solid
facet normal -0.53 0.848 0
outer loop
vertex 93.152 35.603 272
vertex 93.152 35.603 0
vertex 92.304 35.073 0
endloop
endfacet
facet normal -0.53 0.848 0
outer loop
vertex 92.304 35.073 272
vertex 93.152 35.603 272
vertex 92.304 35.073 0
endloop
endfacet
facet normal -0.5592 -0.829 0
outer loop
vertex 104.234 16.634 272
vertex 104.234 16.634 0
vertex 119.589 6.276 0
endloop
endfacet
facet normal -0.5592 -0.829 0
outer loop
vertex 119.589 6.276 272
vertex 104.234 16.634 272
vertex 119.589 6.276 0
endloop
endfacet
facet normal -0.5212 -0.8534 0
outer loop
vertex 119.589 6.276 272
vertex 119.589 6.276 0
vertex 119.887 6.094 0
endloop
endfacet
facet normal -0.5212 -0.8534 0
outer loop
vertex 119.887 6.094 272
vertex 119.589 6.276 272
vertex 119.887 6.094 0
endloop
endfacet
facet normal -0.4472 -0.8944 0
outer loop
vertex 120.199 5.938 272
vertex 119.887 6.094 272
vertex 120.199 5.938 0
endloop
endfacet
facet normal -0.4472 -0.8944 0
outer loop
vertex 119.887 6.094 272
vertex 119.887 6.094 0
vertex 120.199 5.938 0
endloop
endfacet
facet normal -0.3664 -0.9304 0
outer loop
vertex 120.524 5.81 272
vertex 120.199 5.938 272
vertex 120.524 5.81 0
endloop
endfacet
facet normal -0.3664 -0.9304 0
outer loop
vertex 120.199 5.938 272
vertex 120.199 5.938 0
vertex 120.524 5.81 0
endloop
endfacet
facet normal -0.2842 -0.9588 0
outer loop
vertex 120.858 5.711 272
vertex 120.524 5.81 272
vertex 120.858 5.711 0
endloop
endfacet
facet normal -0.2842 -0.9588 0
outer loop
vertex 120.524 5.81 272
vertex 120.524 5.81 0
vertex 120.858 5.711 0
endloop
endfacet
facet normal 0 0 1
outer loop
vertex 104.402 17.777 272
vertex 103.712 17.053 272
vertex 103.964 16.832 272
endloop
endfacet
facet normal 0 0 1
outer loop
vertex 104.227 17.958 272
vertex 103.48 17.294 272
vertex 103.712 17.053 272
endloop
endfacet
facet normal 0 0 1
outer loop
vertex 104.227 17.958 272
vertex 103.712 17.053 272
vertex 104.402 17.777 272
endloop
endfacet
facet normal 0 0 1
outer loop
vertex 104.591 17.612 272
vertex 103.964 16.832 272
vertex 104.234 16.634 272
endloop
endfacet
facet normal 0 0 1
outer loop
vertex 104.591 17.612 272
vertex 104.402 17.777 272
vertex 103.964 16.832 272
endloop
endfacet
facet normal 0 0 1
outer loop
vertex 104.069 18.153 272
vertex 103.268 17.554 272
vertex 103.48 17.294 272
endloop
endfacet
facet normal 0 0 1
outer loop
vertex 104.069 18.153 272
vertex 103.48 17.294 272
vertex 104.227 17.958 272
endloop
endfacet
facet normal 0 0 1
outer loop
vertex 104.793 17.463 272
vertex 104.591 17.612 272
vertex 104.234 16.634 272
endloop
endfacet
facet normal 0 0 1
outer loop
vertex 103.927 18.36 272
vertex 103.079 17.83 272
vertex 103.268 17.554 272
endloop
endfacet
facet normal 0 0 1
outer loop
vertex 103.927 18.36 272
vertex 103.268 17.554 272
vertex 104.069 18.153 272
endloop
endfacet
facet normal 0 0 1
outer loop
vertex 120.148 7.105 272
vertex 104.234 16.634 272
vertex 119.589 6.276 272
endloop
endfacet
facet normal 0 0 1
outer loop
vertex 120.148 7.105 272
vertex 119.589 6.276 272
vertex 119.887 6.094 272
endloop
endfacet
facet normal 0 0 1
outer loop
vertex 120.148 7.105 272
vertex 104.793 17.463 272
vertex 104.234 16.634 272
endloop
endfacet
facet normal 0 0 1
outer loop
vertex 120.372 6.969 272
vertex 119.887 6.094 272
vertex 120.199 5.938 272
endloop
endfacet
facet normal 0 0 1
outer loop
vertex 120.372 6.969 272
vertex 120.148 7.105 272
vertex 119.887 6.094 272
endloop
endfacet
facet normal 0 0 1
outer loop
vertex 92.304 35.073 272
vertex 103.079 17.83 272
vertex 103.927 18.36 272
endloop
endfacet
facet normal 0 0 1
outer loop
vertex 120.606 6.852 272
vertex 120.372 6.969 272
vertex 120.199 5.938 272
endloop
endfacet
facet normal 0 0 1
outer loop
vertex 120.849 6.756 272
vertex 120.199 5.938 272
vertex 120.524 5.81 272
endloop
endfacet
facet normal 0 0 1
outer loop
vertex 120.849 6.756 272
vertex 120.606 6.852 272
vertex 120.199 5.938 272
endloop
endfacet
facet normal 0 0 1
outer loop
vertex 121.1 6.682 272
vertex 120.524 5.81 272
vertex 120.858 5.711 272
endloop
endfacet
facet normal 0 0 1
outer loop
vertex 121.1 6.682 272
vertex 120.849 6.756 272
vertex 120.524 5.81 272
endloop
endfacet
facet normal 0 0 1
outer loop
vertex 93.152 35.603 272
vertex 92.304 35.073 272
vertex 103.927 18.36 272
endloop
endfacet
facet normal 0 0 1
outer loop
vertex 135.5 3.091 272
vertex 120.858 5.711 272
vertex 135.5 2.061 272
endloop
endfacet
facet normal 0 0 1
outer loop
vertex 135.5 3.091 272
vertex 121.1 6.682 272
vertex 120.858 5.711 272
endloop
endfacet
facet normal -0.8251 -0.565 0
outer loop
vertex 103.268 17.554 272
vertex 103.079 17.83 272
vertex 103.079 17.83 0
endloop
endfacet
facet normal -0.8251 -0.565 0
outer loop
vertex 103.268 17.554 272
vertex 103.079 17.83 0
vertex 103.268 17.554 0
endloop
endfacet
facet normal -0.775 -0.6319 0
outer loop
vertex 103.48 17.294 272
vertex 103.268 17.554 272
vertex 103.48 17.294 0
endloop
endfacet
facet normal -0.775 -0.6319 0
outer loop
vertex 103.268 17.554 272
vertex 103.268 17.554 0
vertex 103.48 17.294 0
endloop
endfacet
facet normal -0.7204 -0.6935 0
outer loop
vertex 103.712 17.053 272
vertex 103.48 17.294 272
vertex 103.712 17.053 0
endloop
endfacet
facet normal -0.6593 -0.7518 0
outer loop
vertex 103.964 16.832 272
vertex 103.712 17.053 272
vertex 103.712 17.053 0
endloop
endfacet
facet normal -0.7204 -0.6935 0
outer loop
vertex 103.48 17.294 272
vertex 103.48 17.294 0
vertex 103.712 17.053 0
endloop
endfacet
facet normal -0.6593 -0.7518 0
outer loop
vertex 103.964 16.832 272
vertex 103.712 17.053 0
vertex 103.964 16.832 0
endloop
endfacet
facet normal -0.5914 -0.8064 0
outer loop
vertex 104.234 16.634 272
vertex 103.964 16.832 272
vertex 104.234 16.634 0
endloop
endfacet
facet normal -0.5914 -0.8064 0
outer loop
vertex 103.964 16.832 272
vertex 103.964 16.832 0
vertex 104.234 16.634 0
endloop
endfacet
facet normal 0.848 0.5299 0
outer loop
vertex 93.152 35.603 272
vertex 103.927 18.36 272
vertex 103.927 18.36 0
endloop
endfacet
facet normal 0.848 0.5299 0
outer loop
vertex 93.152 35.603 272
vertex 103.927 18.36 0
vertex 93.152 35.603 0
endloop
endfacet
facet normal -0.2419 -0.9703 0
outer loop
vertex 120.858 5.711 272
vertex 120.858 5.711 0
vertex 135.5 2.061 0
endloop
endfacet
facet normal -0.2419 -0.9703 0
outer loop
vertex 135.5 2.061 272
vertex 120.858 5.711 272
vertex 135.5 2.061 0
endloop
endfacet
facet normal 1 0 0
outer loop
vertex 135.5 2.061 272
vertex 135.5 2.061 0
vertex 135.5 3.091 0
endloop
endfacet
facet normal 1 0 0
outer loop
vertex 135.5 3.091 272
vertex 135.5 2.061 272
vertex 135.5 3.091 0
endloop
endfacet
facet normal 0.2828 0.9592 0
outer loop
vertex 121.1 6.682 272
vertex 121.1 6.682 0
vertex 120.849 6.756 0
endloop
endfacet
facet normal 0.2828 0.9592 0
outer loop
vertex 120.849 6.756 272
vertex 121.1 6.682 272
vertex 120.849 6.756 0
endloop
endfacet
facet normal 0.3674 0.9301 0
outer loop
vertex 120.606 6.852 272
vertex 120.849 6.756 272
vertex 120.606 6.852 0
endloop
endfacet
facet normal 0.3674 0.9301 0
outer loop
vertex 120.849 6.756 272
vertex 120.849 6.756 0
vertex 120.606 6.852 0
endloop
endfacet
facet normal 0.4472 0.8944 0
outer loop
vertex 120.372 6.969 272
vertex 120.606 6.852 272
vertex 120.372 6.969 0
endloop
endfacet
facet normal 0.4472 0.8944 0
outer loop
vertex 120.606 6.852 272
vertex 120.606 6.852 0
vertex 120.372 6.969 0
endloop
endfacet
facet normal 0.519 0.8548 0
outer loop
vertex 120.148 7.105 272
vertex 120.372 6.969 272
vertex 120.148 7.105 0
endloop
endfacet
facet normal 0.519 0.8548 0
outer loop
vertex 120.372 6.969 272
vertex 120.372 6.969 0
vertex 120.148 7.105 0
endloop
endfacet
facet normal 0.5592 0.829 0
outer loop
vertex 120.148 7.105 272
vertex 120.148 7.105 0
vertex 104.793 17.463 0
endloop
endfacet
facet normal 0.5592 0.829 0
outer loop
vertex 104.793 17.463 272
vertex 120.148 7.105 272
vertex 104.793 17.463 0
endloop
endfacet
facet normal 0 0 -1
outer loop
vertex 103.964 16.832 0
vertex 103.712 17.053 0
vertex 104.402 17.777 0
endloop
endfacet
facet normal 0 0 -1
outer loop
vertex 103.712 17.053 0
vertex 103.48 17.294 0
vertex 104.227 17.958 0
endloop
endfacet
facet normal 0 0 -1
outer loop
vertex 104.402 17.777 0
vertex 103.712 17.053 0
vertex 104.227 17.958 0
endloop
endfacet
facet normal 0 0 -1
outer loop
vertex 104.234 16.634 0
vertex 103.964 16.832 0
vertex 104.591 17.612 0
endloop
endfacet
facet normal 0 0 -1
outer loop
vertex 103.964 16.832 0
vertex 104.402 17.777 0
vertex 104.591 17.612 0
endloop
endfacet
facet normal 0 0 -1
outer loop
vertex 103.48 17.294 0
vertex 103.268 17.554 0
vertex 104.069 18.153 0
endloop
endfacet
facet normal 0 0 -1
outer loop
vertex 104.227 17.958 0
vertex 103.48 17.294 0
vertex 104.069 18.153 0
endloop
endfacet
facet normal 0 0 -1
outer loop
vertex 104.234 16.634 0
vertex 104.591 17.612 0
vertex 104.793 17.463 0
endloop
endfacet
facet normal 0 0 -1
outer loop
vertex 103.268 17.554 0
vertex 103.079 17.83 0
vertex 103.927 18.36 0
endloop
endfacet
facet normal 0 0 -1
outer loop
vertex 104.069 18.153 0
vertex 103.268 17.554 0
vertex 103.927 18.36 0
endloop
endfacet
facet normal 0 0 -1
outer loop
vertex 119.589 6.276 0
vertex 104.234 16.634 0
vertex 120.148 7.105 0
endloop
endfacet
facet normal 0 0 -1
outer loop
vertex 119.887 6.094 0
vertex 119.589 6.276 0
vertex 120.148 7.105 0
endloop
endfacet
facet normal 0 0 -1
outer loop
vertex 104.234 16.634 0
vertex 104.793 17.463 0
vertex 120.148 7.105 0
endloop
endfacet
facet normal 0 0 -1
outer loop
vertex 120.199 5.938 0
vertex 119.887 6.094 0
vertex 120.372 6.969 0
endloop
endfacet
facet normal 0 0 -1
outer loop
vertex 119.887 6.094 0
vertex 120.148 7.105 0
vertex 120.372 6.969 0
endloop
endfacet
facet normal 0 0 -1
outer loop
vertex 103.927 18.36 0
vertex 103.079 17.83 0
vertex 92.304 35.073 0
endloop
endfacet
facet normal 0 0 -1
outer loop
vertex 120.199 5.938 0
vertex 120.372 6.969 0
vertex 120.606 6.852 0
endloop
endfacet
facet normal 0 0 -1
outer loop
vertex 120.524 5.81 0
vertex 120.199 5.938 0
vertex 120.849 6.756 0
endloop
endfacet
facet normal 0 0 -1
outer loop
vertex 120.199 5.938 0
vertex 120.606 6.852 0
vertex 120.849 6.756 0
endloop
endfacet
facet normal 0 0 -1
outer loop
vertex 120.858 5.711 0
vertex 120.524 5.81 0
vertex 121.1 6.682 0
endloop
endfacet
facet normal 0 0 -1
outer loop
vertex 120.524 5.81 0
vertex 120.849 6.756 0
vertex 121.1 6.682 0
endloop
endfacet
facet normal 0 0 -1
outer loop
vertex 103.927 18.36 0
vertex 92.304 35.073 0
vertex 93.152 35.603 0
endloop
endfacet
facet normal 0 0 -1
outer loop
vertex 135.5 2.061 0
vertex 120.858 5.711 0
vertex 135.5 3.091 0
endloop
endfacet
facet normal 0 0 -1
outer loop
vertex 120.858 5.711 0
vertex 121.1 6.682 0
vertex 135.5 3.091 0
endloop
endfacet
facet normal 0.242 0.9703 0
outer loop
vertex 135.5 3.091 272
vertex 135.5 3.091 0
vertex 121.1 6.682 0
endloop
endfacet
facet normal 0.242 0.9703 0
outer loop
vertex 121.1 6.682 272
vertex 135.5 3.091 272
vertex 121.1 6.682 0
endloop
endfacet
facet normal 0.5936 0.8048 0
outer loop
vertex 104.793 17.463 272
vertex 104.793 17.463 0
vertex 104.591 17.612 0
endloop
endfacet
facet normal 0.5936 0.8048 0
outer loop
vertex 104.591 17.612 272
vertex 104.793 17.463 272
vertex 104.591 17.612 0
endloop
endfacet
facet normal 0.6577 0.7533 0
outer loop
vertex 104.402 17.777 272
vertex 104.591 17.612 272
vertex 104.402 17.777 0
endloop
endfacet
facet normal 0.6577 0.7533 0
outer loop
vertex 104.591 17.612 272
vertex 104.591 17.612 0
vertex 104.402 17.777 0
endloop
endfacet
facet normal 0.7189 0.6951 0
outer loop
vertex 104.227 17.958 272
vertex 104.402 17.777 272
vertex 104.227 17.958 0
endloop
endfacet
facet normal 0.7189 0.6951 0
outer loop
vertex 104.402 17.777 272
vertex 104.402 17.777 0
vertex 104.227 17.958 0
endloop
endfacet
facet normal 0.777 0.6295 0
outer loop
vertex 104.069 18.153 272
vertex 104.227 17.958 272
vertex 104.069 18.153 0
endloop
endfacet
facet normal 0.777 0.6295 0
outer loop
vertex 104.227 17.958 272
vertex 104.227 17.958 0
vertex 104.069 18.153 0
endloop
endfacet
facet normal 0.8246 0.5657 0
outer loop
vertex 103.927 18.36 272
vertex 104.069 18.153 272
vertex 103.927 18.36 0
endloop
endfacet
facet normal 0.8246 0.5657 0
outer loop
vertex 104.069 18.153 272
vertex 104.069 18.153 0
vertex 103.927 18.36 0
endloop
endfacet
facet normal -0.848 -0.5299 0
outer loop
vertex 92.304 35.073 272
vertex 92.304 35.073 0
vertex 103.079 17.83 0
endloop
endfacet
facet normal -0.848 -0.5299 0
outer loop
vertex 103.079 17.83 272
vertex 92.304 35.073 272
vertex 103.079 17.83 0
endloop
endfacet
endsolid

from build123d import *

# Parameters (mm, degrees)
NESTED_SUPPORT_SKIN_BEHIND_TOE_DEPTH = 272


with BuildPart() as part:
    # Nested support skin behind toe profile → Nested support skin behind toe (new body)
    with BuildSketch(Plane.XY):
        with BuildLine():
            Line((135.5, 3.091362383), (121.100256736, 6.681621613))
            ThreePointArc((121.100256736, 6.681621613), (120.605812494, 6.851872419), (120.148443712, 7.105396074))
            Line((120.148443712, 7.105396074), (104.793241848, 17.462610509))
            ThreePointArc((104.793241848, 17.462610509), (104.312801158, 17.865748115), (103.92667627, 18.359965434))
            Line((103.92667627, 18.359965434), (93.151951904, 35.603128879))
            Line((93.151951904, 35.603128879), (92.303903808, 35.073209614))
            Line((92.303903808, 35.073209614), (103.078628174, 17.83004617))
            ThreePointArc((103.078628174, 17.83004617), (103.593461357, 17.171089745), (104.234048945, 16.633572937))
            Line((104.234048945, 16.633572937), (119.589250809, 6.276358502))
            ThreePointArc((119.589250809, 6.276358502), (120.19907585, 5.938326962), (120.85833484, 5.711325887))
            Line((120.85833484, 5.711325887), (135.5, 2.060748754))
            Line((135.5, 2.060748754), (135.5, 3.091362383))
        make_face()
    extrude(amount=NESTED_SUPPORT_SKIN_BEHIND_TOE_DEPTH)


solid = part.part
